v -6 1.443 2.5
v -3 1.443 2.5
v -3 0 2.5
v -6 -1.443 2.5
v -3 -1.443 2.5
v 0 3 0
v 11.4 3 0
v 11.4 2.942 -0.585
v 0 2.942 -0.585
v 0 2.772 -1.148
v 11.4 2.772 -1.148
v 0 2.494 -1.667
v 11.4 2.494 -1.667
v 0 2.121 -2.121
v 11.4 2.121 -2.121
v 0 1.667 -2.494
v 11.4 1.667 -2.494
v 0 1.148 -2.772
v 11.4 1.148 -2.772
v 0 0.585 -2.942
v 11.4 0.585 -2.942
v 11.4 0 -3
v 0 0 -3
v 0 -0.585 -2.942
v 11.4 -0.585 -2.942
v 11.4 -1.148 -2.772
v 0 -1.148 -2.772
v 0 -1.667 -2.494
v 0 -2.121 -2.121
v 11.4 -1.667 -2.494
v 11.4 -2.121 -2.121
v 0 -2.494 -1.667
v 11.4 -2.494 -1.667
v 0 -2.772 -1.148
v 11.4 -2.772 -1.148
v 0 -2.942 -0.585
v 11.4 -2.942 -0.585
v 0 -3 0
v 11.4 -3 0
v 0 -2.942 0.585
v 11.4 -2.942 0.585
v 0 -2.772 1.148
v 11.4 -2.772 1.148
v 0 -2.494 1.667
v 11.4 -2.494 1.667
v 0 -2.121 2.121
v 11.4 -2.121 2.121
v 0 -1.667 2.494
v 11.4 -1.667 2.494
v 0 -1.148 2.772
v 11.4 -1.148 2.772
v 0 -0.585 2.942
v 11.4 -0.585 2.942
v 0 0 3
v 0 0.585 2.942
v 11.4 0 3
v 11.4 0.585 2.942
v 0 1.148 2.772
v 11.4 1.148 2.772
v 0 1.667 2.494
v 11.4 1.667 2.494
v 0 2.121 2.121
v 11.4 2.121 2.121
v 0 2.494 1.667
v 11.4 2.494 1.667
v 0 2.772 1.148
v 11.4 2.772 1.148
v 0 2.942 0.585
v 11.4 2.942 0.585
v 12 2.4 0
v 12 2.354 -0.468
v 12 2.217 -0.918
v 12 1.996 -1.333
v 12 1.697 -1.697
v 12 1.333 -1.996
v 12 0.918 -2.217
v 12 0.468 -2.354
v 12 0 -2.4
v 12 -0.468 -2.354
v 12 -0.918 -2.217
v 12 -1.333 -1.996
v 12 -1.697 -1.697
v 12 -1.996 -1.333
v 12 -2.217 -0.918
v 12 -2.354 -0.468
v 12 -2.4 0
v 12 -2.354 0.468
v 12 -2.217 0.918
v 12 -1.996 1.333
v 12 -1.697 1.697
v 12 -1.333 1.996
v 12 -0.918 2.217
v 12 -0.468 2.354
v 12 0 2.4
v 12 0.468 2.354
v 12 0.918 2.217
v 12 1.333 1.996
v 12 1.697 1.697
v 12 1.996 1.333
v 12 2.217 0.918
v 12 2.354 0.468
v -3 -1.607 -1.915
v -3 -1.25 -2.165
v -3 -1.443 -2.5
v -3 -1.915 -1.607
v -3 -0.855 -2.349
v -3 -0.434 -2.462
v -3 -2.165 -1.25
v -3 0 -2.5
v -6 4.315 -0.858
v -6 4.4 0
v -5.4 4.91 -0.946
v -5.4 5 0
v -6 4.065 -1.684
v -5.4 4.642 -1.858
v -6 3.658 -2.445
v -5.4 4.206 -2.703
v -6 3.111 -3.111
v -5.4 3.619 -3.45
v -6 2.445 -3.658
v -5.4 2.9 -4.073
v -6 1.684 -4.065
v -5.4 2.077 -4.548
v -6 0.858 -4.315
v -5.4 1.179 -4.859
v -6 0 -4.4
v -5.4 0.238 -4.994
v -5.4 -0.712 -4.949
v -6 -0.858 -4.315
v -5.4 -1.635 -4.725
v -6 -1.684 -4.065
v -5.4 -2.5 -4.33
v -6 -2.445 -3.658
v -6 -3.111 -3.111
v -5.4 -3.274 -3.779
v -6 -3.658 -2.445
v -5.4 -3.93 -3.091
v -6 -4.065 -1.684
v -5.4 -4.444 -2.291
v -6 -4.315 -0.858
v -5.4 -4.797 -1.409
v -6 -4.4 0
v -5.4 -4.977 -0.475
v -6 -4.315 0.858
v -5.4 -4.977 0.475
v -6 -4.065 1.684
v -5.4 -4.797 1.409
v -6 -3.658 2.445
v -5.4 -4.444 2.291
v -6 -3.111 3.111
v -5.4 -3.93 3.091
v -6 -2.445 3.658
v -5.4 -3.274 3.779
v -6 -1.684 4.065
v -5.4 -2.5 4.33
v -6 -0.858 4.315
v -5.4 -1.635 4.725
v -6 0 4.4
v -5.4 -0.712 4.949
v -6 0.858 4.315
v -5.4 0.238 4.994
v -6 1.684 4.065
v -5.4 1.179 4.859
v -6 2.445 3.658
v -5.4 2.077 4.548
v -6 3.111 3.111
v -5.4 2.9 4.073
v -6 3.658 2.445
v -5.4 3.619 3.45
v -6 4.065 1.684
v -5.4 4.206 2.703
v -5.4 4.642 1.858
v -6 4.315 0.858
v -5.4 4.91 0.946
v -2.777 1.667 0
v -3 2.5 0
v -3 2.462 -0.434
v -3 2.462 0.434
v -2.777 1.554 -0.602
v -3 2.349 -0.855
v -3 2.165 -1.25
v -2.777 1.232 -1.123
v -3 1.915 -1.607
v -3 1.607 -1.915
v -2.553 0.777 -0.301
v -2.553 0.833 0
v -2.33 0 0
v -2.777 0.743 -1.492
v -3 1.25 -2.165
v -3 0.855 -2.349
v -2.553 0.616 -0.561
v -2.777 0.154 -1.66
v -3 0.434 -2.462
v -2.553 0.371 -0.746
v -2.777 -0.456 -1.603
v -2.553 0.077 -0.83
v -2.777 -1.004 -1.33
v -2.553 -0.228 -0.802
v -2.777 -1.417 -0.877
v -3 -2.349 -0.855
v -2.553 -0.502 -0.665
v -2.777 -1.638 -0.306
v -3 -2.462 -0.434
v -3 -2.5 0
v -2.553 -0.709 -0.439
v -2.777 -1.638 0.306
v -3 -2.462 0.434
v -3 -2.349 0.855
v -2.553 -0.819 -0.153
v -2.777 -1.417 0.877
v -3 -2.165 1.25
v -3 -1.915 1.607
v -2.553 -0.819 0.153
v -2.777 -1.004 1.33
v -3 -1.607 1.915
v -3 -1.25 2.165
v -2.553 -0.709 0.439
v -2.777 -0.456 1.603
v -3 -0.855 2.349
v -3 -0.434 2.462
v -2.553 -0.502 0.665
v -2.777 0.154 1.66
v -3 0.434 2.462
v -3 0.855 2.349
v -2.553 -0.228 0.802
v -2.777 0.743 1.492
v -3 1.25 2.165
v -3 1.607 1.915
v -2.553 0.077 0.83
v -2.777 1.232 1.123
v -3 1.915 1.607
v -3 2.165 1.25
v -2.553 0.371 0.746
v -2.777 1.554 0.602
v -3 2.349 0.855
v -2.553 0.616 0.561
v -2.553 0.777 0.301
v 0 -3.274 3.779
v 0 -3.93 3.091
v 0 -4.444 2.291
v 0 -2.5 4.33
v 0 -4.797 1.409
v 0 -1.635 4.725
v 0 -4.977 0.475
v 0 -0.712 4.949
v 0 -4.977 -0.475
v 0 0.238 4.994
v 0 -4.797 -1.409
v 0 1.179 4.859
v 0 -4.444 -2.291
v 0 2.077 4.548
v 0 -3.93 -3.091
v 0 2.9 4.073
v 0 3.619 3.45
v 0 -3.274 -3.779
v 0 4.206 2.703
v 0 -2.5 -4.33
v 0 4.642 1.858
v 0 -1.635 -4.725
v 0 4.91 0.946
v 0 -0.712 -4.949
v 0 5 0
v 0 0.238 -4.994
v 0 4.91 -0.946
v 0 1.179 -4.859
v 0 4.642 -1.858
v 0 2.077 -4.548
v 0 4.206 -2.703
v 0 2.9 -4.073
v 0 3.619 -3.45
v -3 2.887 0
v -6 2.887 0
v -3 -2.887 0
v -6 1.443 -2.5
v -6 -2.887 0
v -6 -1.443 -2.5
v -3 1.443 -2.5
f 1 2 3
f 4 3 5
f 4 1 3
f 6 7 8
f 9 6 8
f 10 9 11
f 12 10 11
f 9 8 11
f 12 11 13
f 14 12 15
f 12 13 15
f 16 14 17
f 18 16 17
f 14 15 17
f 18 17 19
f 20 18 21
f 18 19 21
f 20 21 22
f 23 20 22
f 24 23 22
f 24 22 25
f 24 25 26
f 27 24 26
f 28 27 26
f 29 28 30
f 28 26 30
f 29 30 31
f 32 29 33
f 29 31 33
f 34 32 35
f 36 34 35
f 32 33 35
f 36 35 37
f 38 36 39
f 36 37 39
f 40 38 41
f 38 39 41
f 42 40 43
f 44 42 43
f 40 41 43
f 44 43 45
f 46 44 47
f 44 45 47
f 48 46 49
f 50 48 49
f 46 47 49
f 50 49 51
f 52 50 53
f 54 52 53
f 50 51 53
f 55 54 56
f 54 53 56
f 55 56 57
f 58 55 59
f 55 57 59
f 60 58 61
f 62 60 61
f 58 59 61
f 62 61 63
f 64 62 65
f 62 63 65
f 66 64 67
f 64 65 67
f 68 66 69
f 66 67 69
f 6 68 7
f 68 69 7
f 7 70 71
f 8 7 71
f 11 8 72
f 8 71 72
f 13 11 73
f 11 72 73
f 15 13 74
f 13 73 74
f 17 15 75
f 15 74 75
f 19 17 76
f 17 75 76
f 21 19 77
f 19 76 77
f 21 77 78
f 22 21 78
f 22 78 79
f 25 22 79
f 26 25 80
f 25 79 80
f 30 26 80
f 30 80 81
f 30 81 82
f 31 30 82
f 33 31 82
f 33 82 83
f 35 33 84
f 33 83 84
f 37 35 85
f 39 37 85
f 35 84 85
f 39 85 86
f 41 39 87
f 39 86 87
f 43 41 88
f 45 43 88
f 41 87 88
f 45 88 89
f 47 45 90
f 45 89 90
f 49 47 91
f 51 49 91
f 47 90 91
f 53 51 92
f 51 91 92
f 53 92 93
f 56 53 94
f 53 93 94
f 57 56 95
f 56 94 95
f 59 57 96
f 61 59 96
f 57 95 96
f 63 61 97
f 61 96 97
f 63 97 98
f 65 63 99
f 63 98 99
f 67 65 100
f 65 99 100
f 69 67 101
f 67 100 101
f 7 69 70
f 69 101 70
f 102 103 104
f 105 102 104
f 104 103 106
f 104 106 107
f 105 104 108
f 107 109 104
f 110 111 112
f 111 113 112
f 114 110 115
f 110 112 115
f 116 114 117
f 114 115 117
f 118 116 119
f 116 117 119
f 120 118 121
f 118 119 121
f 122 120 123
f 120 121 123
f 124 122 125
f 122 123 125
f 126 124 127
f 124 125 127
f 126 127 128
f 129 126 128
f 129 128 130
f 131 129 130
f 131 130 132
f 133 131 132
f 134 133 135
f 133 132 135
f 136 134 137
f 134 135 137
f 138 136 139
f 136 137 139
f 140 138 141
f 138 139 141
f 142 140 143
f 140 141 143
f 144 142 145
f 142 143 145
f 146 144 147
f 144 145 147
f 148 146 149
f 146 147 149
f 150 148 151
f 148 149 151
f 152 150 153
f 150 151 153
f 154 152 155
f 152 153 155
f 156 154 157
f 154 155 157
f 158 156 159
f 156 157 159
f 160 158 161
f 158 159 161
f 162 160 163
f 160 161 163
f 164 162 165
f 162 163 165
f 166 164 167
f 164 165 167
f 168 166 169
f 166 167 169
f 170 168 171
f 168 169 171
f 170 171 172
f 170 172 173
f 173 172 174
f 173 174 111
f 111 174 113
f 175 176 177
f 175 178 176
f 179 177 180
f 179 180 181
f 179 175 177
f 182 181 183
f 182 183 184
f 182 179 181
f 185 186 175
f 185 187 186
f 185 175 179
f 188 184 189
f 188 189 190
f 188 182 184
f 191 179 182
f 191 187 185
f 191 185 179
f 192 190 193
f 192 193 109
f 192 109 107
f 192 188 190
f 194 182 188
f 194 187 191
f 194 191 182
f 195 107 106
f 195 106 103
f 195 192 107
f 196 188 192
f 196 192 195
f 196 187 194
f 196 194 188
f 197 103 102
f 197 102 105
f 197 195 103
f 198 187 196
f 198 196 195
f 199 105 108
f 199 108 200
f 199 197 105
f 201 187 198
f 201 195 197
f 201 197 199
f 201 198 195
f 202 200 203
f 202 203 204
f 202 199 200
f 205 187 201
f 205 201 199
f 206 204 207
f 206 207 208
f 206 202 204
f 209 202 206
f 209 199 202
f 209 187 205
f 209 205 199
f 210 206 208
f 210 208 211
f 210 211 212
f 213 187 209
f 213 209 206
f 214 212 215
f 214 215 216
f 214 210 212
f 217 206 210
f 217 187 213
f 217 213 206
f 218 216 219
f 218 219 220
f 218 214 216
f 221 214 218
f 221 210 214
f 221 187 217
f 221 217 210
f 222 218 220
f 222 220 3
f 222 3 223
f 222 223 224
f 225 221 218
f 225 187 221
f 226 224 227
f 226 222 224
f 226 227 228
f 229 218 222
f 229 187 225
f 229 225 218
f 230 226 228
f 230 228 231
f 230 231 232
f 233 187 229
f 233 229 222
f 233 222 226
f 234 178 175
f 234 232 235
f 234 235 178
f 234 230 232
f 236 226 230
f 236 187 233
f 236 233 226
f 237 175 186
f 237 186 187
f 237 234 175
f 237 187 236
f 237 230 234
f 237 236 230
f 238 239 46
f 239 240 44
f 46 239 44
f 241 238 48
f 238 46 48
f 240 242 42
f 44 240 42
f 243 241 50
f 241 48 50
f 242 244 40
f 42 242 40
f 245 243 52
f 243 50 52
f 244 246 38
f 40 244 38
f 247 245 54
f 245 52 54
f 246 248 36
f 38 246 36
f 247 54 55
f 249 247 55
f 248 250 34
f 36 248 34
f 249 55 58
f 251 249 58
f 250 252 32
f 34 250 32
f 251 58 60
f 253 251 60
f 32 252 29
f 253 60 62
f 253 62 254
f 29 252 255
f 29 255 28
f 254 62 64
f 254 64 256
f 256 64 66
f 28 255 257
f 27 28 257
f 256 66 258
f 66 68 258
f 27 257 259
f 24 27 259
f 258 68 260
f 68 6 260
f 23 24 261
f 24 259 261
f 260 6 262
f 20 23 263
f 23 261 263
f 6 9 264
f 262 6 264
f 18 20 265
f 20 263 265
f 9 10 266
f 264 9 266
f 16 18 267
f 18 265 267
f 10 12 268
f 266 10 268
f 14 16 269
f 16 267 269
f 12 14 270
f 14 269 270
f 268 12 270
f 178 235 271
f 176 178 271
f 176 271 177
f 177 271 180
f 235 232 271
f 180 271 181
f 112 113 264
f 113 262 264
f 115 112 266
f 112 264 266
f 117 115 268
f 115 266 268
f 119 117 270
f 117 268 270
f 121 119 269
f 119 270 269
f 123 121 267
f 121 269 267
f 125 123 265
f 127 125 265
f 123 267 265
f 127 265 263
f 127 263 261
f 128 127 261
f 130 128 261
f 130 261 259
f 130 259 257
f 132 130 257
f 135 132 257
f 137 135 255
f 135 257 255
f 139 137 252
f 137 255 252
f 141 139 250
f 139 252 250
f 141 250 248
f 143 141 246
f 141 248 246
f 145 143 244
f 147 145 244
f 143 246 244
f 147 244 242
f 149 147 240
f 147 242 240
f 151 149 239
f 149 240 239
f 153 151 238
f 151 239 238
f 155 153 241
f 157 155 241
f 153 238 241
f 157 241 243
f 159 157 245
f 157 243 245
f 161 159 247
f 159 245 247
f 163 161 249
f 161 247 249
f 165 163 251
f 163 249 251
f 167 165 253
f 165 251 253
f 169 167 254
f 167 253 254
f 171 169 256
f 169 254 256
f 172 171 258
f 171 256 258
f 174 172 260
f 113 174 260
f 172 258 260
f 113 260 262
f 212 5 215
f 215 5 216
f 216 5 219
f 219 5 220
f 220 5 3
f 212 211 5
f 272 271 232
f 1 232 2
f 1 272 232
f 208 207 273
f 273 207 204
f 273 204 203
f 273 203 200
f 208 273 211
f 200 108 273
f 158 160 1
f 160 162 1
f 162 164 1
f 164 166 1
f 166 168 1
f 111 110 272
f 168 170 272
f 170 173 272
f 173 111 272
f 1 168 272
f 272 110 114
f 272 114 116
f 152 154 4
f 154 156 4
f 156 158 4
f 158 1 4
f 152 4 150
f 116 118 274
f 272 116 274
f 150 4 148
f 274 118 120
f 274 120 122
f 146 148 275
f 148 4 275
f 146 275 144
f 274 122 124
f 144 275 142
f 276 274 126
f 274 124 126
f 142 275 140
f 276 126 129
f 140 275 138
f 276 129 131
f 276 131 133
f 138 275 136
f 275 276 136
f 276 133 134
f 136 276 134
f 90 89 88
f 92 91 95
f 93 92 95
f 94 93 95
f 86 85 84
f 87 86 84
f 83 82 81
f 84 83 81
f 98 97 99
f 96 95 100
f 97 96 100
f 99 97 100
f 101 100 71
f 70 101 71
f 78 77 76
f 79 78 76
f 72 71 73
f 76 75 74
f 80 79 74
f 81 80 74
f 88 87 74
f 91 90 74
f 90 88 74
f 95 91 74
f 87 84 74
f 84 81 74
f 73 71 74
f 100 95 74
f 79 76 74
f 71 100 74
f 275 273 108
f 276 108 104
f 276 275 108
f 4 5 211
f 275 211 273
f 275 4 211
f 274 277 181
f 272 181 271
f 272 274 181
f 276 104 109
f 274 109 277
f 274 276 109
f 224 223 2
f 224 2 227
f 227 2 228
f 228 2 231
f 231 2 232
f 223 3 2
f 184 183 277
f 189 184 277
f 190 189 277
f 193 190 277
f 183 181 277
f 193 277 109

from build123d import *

# Parameters (mm, degrees)
CHAMFER1_SIZE      = 0.6
CUT_EXTRUDE1_DEPTH = 3


with BuildPart() as part:
    # Sketch1 → Revolve1 (revolve)
    with BuildSketch(Plane.XY):
        Polygon((-6, 0), (-6, 4.4), (-5.4, 5), (0, 5), (0, 3), (12, 3), (12, 0), align=None)
    revolve(axis=Axis((12, 0, 0), (-1, 0, 0)))

    # Chamfer1
    chamfer1_edges = [part.edges().sort_by_distance(p)[0] for p in [
        (12, -3, 0),
    ]]
    chamfer(chamfer1_edges, length=CHAMFER1_SIZE)

    # Sketch2 → Cut-Revolve1 (revolve, cut)
    with BuildSketch(Plane.XY):
        Polygon((-6, 0), (-6, 2.5), (-3, 2.5), (-2.330127019, 0), align=None)
    revolve(axis=Axis((-2.330127019, 0, 0), (-1, 0, 0)), mode=Mode.SUBTRACT)

    # Sketch3 → Cut-Extrude1 (cut)
    with BuildSketch(Plane(origin=(-6, 0, 0), x_dir=(0, 0, -1), z_dir=(1, 0, 0))):
        Polygon((-2.5, 1.443375673), (-2.5, -1.443375673), (0, -2.886751346), (2.5, -1.443375673), (2.5, 1.443375673), (0, 2.886751346), align=None)
    extrude(amount=CUT_EXTRUDE1_DEPTH, mode=Mode.SUBTRACT)


solid = part.part
